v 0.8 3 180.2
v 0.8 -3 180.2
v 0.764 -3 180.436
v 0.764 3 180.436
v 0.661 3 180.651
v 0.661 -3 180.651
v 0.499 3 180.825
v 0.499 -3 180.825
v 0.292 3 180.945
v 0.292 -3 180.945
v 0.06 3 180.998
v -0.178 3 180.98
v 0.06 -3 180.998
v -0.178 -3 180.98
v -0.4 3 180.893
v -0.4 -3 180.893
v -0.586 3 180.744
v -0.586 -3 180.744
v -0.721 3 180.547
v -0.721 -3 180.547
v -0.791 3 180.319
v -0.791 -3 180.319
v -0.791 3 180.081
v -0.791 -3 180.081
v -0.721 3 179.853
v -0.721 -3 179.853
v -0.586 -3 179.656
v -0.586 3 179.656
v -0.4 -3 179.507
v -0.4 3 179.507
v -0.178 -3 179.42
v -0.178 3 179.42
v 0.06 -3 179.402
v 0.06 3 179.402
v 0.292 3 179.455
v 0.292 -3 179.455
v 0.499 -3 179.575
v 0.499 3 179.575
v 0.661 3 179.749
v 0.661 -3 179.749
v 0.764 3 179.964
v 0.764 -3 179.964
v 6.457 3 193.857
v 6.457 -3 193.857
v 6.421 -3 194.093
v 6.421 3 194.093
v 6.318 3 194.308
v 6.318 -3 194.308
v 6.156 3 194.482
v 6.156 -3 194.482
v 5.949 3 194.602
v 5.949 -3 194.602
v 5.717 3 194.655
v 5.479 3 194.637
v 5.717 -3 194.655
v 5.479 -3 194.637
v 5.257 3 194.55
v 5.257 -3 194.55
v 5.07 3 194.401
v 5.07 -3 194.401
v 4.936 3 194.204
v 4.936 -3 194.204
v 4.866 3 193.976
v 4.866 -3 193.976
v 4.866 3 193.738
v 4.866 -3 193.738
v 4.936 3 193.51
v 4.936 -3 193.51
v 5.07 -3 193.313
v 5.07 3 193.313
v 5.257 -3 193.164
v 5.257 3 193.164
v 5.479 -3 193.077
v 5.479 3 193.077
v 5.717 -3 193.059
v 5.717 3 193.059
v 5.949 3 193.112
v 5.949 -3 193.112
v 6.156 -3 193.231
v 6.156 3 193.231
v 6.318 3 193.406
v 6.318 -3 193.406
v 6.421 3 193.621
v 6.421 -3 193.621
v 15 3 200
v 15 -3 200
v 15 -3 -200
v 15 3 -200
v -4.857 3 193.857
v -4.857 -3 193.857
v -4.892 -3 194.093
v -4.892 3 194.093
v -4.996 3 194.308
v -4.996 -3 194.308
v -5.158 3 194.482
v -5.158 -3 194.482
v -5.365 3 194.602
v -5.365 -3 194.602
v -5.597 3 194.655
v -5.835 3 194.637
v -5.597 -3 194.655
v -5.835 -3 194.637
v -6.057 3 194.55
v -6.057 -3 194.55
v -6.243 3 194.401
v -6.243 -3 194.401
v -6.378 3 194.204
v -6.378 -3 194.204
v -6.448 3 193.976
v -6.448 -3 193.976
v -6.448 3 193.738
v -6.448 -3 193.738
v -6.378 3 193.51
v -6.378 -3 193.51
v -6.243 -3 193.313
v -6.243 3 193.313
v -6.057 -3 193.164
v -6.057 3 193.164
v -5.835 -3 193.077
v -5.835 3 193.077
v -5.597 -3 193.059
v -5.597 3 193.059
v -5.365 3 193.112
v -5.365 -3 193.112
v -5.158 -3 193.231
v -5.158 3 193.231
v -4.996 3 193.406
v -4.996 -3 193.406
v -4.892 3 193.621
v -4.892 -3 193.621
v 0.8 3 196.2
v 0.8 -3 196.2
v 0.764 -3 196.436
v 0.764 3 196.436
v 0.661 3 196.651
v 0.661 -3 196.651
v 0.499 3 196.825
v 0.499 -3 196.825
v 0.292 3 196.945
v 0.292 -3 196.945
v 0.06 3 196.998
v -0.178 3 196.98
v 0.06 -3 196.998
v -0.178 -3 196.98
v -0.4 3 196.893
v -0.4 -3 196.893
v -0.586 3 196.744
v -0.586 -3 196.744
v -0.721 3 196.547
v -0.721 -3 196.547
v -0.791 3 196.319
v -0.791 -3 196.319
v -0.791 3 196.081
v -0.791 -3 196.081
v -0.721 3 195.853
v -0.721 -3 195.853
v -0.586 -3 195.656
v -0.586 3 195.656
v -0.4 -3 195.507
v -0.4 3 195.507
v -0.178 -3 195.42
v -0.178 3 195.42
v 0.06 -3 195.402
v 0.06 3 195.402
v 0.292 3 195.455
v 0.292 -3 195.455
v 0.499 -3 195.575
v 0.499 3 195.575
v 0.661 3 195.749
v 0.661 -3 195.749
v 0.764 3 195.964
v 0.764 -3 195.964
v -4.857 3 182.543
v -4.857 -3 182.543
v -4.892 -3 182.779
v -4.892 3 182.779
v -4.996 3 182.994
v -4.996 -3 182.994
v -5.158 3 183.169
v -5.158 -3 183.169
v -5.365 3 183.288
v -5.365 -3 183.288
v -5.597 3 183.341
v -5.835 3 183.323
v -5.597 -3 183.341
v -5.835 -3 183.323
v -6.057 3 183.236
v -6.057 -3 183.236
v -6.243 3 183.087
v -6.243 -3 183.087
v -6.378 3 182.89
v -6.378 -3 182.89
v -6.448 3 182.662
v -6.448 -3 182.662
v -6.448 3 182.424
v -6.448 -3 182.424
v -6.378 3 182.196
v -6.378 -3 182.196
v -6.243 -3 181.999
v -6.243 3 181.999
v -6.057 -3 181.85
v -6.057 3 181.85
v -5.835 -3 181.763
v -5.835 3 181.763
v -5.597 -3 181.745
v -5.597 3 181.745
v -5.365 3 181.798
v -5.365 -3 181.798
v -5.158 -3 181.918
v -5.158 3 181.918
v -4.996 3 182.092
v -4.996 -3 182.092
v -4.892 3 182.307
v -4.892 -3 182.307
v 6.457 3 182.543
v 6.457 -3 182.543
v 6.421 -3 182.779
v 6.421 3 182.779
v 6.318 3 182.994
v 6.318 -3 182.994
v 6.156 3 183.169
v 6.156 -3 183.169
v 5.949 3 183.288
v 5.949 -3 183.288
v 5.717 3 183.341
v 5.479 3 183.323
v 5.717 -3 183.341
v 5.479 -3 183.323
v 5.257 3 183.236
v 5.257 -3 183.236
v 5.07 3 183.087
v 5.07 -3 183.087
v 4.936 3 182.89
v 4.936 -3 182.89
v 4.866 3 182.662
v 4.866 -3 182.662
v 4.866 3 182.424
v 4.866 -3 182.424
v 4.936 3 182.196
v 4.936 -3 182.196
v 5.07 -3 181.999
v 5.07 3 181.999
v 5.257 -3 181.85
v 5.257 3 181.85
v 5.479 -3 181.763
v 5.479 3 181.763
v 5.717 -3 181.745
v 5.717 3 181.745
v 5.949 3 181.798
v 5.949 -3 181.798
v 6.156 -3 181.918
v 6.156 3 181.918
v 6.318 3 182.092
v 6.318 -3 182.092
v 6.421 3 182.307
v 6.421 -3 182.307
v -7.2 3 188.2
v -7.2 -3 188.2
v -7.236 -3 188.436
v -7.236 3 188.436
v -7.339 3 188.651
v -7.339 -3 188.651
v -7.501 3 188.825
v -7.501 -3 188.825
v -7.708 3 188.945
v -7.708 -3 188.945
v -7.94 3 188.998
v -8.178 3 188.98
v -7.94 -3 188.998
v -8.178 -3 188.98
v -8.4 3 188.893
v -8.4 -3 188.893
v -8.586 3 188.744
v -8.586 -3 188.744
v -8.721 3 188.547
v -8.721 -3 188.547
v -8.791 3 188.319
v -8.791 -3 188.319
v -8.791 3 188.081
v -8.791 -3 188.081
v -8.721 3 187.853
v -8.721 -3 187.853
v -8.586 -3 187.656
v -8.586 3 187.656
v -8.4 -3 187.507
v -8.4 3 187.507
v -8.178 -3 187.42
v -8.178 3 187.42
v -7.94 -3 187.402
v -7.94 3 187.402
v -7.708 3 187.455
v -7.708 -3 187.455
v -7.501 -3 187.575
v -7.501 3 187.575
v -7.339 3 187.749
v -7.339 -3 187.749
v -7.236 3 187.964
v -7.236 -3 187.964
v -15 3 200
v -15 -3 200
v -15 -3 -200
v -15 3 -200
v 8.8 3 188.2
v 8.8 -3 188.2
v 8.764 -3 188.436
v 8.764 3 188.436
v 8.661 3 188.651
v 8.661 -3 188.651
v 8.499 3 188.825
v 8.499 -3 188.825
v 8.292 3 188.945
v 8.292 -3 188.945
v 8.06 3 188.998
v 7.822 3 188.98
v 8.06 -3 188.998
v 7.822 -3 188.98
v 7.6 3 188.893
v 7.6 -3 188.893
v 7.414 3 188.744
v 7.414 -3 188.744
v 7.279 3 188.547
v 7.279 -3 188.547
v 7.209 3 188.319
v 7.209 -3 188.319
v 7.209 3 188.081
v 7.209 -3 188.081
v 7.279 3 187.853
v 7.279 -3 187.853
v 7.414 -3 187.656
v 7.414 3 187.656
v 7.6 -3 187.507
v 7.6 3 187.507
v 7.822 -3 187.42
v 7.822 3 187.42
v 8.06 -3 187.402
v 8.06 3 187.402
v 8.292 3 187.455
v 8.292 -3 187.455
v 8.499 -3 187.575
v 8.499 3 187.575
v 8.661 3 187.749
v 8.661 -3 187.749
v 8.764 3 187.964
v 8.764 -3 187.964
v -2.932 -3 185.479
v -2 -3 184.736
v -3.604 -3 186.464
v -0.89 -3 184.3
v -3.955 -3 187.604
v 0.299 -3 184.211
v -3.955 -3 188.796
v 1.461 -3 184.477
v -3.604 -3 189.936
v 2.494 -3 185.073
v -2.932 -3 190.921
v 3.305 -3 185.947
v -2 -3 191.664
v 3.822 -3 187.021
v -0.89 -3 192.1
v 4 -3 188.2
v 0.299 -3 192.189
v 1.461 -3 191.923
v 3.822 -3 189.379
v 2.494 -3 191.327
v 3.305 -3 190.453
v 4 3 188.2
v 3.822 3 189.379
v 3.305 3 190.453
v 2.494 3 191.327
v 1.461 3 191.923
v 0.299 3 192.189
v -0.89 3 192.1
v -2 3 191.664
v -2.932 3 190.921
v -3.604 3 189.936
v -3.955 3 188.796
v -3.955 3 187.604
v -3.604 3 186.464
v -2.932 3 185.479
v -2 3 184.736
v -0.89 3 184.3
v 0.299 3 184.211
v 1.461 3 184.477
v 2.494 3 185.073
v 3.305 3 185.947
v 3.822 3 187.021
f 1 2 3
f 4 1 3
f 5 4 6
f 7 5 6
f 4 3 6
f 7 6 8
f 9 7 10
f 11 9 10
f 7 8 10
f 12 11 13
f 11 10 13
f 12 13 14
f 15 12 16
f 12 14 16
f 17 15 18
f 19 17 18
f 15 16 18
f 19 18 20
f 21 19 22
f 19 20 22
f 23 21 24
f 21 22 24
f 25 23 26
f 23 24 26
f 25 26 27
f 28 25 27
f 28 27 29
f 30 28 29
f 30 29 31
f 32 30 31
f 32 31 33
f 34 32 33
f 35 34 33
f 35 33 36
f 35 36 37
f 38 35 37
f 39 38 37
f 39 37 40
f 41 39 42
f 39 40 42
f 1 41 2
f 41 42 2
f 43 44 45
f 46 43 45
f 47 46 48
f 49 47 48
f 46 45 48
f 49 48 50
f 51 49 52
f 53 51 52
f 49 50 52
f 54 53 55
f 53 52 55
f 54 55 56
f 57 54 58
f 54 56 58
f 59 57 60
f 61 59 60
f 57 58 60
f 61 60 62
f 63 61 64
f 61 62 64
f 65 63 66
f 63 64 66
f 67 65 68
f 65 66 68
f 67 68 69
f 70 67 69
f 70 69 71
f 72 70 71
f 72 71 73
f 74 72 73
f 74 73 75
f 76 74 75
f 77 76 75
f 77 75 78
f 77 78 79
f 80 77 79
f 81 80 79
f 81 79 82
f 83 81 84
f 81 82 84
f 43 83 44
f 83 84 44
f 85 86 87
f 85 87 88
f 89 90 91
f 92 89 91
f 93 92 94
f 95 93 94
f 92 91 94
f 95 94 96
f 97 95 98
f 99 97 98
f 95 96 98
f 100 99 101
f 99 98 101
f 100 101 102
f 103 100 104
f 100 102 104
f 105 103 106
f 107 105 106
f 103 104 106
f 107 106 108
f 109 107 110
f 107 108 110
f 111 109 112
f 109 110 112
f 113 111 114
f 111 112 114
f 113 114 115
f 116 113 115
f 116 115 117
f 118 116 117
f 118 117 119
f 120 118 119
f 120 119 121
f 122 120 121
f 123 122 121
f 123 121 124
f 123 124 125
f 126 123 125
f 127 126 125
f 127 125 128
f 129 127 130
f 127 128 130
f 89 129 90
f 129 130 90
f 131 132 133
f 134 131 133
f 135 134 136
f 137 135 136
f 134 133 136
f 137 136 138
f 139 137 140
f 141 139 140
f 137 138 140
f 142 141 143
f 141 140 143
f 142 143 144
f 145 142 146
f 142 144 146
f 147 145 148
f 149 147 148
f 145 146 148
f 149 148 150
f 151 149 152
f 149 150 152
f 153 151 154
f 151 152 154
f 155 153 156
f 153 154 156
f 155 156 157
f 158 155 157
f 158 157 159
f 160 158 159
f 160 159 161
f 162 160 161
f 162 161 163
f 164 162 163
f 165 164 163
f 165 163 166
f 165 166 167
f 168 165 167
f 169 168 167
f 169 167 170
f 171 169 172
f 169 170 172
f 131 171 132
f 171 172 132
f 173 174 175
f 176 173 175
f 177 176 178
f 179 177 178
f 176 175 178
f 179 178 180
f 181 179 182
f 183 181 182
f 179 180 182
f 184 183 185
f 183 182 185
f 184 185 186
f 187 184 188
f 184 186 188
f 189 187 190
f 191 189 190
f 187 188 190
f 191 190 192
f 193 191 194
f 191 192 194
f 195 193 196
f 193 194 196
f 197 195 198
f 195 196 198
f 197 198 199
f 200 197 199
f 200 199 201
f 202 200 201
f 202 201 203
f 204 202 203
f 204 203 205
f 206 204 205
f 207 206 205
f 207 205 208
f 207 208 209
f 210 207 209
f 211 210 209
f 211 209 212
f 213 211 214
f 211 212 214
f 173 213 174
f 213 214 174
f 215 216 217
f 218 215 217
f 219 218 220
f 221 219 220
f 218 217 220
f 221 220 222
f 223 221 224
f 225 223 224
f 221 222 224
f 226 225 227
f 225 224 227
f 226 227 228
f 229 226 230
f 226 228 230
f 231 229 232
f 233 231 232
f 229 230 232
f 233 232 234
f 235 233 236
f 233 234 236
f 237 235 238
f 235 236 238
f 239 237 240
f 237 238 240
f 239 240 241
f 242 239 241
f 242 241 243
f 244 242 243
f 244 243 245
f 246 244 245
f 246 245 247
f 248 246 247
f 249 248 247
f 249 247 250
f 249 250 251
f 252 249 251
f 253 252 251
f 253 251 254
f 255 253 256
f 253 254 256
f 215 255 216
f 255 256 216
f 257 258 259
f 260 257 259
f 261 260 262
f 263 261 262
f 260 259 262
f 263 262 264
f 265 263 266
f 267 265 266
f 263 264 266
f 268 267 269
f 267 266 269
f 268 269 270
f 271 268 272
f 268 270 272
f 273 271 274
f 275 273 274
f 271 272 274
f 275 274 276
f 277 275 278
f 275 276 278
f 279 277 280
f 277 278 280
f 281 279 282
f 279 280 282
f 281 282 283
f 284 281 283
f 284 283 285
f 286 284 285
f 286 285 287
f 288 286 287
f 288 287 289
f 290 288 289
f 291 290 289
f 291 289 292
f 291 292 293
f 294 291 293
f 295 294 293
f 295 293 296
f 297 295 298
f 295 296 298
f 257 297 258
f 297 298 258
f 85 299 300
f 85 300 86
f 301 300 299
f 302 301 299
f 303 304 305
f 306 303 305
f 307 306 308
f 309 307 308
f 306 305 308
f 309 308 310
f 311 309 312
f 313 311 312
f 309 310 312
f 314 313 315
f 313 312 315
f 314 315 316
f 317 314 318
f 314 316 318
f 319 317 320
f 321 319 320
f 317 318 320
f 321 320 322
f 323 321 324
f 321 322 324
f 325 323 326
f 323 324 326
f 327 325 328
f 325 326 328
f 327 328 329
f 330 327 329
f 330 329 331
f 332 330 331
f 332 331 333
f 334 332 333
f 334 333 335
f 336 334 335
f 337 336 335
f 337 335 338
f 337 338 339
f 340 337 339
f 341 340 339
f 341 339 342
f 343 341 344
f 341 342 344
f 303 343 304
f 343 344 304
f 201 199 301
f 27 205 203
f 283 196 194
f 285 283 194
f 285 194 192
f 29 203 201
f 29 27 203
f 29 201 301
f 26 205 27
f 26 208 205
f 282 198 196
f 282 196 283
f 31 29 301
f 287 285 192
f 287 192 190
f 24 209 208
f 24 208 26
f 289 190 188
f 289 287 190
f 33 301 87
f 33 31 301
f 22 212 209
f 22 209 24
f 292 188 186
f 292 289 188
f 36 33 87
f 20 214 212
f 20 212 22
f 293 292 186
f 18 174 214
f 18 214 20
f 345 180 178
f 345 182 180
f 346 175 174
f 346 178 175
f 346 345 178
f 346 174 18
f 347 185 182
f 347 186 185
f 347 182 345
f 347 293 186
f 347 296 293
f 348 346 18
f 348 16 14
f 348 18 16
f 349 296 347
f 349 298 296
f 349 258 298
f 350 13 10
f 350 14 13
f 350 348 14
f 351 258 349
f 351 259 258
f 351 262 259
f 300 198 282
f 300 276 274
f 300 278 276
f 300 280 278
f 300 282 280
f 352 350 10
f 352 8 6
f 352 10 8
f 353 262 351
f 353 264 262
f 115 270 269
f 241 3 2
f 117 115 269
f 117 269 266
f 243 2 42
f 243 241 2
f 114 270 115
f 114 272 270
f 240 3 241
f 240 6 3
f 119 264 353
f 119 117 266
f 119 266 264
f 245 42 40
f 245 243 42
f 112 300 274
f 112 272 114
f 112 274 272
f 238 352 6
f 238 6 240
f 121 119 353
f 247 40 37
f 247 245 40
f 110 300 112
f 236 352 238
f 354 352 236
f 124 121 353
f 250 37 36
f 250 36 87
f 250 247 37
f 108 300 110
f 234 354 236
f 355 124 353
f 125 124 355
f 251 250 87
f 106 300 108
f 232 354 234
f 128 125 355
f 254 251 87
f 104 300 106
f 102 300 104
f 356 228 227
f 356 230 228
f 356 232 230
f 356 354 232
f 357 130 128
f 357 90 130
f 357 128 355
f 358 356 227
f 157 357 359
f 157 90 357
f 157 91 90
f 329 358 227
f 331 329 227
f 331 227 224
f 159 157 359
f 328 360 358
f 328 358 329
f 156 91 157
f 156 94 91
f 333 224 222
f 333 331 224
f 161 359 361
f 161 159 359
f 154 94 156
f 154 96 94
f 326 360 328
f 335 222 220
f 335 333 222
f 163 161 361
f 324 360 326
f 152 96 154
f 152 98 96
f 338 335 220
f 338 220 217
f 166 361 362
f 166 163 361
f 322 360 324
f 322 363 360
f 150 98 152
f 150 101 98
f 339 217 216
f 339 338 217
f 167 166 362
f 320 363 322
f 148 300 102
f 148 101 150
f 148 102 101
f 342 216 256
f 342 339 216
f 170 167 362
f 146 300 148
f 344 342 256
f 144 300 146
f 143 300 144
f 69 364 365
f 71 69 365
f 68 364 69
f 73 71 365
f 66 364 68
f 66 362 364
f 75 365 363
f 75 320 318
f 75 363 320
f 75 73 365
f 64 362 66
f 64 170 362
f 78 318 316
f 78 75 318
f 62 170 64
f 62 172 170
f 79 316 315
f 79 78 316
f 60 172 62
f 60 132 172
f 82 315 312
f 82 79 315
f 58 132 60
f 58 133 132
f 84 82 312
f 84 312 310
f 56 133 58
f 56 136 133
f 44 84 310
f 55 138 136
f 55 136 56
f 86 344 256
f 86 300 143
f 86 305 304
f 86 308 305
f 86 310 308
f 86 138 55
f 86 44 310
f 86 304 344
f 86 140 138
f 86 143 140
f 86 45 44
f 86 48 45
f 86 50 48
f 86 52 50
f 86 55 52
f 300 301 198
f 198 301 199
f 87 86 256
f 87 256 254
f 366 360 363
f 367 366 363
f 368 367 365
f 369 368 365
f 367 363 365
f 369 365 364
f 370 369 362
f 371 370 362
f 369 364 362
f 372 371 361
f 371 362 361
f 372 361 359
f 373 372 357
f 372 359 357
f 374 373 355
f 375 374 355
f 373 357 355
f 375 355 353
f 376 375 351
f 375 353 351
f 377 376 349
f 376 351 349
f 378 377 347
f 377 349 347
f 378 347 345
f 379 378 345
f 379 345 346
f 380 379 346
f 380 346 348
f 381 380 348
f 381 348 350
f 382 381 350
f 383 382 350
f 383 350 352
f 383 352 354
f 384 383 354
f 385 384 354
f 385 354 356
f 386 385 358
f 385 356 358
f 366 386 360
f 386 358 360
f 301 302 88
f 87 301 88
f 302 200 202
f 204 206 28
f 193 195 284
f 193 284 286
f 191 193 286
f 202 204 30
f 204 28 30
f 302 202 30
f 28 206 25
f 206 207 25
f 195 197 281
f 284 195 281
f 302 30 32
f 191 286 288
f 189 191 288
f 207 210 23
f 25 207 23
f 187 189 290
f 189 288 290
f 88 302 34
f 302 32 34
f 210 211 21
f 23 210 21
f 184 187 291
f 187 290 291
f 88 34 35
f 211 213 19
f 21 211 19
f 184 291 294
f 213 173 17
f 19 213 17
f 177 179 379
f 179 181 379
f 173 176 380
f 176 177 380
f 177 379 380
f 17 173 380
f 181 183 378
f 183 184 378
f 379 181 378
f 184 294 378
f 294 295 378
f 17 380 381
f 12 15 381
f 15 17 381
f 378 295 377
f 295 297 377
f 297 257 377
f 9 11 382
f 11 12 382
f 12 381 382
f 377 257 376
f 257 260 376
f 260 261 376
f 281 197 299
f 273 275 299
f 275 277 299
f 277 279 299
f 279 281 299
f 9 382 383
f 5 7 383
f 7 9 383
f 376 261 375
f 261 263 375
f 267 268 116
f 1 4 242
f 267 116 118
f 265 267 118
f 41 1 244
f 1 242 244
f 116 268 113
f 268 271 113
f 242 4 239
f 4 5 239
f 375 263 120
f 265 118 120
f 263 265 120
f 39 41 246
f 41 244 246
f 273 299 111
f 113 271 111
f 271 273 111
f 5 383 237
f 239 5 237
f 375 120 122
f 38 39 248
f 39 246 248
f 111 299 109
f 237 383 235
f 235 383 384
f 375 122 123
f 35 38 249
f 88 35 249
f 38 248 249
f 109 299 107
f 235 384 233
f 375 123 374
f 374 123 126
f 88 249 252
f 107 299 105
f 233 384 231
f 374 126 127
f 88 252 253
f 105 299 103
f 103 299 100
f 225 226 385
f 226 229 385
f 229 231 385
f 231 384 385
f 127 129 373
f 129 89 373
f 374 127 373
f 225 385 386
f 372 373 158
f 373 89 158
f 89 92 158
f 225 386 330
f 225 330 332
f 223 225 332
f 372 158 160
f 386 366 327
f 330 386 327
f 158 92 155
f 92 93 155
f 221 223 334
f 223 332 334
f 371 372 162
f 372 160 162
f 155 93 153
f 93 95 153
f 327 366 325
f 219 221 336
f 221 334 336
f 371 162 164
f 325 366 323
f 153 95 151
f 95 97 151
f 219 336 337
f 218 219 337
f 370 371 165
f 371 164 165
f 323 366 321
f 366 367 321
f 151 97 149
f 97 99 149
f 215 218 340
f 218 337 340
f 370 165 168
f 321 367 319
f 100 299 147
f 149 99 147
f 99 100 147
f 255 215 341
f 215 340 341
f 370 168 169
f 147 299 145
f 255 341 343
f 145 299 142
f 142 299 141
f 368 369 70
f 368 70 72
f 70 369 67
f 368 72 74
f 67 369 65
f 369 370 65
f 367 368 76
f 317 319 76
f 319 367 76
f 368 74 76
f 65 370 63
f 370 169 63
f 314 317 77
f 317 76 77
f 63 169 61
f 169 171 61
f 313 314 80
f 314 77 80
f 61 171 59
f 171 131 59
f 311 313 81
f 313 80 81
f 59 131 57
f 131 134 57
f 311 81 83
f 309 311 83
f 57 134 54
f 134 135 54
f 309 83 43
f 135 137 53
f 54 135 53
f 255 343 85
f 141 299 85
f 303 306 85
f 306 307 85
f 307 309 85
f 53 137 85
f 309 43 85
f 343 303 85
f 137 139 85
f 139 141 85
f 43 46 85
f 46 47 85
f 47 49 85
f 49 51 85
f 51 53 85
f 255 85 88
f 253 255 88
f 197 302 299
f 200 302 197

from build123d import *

# Parameters (mm, degrees)
F0_W     = 30
F0_H     = 6
F1_DEPTH = 200
F2_R     = 0.8
F2_R_2   = 4
F3_DEPTH = 6


with BuildPart() as f1:
    # F0 (on Top) → F1 (new body, symmetric)
    with BuildSketch(Plane.XY):
        Rectangle(F0_W, F0_H)
    extrude(amount=F1_DEPTH, both=True)

    # F2 (on face) → F3 (cut, through all)
    with BuildSketch(Plane.XZ.offset(3)):
        with Locations((0, 196.2)):
            Circle(F2_R)
        with Locations((0, 188.2)):
            Circle(F2_R_2)
        with Locations((-5.656854, 193.856854)):
            Circle(F2_R)
        with Locations((-8, 188.2)):
            Circle(F2_R)
        with Locations((-5.656854, 182.543146)):
            Circle(F2_R)
        with Locations((0, 180.2)):
            Circle(F2_R)
        with Locations((5.656854, 182.543146)):
            Circle(F2_R)
        with Locations((8, 188.2)):
            Circle(F2_R)
        with Locations((5.656854, 193.856854)):
            Circle(F2_R)
    extrude(amount=-F3_DEPTH, mode=Mode.SUBTRACT)


solid = f1.part
